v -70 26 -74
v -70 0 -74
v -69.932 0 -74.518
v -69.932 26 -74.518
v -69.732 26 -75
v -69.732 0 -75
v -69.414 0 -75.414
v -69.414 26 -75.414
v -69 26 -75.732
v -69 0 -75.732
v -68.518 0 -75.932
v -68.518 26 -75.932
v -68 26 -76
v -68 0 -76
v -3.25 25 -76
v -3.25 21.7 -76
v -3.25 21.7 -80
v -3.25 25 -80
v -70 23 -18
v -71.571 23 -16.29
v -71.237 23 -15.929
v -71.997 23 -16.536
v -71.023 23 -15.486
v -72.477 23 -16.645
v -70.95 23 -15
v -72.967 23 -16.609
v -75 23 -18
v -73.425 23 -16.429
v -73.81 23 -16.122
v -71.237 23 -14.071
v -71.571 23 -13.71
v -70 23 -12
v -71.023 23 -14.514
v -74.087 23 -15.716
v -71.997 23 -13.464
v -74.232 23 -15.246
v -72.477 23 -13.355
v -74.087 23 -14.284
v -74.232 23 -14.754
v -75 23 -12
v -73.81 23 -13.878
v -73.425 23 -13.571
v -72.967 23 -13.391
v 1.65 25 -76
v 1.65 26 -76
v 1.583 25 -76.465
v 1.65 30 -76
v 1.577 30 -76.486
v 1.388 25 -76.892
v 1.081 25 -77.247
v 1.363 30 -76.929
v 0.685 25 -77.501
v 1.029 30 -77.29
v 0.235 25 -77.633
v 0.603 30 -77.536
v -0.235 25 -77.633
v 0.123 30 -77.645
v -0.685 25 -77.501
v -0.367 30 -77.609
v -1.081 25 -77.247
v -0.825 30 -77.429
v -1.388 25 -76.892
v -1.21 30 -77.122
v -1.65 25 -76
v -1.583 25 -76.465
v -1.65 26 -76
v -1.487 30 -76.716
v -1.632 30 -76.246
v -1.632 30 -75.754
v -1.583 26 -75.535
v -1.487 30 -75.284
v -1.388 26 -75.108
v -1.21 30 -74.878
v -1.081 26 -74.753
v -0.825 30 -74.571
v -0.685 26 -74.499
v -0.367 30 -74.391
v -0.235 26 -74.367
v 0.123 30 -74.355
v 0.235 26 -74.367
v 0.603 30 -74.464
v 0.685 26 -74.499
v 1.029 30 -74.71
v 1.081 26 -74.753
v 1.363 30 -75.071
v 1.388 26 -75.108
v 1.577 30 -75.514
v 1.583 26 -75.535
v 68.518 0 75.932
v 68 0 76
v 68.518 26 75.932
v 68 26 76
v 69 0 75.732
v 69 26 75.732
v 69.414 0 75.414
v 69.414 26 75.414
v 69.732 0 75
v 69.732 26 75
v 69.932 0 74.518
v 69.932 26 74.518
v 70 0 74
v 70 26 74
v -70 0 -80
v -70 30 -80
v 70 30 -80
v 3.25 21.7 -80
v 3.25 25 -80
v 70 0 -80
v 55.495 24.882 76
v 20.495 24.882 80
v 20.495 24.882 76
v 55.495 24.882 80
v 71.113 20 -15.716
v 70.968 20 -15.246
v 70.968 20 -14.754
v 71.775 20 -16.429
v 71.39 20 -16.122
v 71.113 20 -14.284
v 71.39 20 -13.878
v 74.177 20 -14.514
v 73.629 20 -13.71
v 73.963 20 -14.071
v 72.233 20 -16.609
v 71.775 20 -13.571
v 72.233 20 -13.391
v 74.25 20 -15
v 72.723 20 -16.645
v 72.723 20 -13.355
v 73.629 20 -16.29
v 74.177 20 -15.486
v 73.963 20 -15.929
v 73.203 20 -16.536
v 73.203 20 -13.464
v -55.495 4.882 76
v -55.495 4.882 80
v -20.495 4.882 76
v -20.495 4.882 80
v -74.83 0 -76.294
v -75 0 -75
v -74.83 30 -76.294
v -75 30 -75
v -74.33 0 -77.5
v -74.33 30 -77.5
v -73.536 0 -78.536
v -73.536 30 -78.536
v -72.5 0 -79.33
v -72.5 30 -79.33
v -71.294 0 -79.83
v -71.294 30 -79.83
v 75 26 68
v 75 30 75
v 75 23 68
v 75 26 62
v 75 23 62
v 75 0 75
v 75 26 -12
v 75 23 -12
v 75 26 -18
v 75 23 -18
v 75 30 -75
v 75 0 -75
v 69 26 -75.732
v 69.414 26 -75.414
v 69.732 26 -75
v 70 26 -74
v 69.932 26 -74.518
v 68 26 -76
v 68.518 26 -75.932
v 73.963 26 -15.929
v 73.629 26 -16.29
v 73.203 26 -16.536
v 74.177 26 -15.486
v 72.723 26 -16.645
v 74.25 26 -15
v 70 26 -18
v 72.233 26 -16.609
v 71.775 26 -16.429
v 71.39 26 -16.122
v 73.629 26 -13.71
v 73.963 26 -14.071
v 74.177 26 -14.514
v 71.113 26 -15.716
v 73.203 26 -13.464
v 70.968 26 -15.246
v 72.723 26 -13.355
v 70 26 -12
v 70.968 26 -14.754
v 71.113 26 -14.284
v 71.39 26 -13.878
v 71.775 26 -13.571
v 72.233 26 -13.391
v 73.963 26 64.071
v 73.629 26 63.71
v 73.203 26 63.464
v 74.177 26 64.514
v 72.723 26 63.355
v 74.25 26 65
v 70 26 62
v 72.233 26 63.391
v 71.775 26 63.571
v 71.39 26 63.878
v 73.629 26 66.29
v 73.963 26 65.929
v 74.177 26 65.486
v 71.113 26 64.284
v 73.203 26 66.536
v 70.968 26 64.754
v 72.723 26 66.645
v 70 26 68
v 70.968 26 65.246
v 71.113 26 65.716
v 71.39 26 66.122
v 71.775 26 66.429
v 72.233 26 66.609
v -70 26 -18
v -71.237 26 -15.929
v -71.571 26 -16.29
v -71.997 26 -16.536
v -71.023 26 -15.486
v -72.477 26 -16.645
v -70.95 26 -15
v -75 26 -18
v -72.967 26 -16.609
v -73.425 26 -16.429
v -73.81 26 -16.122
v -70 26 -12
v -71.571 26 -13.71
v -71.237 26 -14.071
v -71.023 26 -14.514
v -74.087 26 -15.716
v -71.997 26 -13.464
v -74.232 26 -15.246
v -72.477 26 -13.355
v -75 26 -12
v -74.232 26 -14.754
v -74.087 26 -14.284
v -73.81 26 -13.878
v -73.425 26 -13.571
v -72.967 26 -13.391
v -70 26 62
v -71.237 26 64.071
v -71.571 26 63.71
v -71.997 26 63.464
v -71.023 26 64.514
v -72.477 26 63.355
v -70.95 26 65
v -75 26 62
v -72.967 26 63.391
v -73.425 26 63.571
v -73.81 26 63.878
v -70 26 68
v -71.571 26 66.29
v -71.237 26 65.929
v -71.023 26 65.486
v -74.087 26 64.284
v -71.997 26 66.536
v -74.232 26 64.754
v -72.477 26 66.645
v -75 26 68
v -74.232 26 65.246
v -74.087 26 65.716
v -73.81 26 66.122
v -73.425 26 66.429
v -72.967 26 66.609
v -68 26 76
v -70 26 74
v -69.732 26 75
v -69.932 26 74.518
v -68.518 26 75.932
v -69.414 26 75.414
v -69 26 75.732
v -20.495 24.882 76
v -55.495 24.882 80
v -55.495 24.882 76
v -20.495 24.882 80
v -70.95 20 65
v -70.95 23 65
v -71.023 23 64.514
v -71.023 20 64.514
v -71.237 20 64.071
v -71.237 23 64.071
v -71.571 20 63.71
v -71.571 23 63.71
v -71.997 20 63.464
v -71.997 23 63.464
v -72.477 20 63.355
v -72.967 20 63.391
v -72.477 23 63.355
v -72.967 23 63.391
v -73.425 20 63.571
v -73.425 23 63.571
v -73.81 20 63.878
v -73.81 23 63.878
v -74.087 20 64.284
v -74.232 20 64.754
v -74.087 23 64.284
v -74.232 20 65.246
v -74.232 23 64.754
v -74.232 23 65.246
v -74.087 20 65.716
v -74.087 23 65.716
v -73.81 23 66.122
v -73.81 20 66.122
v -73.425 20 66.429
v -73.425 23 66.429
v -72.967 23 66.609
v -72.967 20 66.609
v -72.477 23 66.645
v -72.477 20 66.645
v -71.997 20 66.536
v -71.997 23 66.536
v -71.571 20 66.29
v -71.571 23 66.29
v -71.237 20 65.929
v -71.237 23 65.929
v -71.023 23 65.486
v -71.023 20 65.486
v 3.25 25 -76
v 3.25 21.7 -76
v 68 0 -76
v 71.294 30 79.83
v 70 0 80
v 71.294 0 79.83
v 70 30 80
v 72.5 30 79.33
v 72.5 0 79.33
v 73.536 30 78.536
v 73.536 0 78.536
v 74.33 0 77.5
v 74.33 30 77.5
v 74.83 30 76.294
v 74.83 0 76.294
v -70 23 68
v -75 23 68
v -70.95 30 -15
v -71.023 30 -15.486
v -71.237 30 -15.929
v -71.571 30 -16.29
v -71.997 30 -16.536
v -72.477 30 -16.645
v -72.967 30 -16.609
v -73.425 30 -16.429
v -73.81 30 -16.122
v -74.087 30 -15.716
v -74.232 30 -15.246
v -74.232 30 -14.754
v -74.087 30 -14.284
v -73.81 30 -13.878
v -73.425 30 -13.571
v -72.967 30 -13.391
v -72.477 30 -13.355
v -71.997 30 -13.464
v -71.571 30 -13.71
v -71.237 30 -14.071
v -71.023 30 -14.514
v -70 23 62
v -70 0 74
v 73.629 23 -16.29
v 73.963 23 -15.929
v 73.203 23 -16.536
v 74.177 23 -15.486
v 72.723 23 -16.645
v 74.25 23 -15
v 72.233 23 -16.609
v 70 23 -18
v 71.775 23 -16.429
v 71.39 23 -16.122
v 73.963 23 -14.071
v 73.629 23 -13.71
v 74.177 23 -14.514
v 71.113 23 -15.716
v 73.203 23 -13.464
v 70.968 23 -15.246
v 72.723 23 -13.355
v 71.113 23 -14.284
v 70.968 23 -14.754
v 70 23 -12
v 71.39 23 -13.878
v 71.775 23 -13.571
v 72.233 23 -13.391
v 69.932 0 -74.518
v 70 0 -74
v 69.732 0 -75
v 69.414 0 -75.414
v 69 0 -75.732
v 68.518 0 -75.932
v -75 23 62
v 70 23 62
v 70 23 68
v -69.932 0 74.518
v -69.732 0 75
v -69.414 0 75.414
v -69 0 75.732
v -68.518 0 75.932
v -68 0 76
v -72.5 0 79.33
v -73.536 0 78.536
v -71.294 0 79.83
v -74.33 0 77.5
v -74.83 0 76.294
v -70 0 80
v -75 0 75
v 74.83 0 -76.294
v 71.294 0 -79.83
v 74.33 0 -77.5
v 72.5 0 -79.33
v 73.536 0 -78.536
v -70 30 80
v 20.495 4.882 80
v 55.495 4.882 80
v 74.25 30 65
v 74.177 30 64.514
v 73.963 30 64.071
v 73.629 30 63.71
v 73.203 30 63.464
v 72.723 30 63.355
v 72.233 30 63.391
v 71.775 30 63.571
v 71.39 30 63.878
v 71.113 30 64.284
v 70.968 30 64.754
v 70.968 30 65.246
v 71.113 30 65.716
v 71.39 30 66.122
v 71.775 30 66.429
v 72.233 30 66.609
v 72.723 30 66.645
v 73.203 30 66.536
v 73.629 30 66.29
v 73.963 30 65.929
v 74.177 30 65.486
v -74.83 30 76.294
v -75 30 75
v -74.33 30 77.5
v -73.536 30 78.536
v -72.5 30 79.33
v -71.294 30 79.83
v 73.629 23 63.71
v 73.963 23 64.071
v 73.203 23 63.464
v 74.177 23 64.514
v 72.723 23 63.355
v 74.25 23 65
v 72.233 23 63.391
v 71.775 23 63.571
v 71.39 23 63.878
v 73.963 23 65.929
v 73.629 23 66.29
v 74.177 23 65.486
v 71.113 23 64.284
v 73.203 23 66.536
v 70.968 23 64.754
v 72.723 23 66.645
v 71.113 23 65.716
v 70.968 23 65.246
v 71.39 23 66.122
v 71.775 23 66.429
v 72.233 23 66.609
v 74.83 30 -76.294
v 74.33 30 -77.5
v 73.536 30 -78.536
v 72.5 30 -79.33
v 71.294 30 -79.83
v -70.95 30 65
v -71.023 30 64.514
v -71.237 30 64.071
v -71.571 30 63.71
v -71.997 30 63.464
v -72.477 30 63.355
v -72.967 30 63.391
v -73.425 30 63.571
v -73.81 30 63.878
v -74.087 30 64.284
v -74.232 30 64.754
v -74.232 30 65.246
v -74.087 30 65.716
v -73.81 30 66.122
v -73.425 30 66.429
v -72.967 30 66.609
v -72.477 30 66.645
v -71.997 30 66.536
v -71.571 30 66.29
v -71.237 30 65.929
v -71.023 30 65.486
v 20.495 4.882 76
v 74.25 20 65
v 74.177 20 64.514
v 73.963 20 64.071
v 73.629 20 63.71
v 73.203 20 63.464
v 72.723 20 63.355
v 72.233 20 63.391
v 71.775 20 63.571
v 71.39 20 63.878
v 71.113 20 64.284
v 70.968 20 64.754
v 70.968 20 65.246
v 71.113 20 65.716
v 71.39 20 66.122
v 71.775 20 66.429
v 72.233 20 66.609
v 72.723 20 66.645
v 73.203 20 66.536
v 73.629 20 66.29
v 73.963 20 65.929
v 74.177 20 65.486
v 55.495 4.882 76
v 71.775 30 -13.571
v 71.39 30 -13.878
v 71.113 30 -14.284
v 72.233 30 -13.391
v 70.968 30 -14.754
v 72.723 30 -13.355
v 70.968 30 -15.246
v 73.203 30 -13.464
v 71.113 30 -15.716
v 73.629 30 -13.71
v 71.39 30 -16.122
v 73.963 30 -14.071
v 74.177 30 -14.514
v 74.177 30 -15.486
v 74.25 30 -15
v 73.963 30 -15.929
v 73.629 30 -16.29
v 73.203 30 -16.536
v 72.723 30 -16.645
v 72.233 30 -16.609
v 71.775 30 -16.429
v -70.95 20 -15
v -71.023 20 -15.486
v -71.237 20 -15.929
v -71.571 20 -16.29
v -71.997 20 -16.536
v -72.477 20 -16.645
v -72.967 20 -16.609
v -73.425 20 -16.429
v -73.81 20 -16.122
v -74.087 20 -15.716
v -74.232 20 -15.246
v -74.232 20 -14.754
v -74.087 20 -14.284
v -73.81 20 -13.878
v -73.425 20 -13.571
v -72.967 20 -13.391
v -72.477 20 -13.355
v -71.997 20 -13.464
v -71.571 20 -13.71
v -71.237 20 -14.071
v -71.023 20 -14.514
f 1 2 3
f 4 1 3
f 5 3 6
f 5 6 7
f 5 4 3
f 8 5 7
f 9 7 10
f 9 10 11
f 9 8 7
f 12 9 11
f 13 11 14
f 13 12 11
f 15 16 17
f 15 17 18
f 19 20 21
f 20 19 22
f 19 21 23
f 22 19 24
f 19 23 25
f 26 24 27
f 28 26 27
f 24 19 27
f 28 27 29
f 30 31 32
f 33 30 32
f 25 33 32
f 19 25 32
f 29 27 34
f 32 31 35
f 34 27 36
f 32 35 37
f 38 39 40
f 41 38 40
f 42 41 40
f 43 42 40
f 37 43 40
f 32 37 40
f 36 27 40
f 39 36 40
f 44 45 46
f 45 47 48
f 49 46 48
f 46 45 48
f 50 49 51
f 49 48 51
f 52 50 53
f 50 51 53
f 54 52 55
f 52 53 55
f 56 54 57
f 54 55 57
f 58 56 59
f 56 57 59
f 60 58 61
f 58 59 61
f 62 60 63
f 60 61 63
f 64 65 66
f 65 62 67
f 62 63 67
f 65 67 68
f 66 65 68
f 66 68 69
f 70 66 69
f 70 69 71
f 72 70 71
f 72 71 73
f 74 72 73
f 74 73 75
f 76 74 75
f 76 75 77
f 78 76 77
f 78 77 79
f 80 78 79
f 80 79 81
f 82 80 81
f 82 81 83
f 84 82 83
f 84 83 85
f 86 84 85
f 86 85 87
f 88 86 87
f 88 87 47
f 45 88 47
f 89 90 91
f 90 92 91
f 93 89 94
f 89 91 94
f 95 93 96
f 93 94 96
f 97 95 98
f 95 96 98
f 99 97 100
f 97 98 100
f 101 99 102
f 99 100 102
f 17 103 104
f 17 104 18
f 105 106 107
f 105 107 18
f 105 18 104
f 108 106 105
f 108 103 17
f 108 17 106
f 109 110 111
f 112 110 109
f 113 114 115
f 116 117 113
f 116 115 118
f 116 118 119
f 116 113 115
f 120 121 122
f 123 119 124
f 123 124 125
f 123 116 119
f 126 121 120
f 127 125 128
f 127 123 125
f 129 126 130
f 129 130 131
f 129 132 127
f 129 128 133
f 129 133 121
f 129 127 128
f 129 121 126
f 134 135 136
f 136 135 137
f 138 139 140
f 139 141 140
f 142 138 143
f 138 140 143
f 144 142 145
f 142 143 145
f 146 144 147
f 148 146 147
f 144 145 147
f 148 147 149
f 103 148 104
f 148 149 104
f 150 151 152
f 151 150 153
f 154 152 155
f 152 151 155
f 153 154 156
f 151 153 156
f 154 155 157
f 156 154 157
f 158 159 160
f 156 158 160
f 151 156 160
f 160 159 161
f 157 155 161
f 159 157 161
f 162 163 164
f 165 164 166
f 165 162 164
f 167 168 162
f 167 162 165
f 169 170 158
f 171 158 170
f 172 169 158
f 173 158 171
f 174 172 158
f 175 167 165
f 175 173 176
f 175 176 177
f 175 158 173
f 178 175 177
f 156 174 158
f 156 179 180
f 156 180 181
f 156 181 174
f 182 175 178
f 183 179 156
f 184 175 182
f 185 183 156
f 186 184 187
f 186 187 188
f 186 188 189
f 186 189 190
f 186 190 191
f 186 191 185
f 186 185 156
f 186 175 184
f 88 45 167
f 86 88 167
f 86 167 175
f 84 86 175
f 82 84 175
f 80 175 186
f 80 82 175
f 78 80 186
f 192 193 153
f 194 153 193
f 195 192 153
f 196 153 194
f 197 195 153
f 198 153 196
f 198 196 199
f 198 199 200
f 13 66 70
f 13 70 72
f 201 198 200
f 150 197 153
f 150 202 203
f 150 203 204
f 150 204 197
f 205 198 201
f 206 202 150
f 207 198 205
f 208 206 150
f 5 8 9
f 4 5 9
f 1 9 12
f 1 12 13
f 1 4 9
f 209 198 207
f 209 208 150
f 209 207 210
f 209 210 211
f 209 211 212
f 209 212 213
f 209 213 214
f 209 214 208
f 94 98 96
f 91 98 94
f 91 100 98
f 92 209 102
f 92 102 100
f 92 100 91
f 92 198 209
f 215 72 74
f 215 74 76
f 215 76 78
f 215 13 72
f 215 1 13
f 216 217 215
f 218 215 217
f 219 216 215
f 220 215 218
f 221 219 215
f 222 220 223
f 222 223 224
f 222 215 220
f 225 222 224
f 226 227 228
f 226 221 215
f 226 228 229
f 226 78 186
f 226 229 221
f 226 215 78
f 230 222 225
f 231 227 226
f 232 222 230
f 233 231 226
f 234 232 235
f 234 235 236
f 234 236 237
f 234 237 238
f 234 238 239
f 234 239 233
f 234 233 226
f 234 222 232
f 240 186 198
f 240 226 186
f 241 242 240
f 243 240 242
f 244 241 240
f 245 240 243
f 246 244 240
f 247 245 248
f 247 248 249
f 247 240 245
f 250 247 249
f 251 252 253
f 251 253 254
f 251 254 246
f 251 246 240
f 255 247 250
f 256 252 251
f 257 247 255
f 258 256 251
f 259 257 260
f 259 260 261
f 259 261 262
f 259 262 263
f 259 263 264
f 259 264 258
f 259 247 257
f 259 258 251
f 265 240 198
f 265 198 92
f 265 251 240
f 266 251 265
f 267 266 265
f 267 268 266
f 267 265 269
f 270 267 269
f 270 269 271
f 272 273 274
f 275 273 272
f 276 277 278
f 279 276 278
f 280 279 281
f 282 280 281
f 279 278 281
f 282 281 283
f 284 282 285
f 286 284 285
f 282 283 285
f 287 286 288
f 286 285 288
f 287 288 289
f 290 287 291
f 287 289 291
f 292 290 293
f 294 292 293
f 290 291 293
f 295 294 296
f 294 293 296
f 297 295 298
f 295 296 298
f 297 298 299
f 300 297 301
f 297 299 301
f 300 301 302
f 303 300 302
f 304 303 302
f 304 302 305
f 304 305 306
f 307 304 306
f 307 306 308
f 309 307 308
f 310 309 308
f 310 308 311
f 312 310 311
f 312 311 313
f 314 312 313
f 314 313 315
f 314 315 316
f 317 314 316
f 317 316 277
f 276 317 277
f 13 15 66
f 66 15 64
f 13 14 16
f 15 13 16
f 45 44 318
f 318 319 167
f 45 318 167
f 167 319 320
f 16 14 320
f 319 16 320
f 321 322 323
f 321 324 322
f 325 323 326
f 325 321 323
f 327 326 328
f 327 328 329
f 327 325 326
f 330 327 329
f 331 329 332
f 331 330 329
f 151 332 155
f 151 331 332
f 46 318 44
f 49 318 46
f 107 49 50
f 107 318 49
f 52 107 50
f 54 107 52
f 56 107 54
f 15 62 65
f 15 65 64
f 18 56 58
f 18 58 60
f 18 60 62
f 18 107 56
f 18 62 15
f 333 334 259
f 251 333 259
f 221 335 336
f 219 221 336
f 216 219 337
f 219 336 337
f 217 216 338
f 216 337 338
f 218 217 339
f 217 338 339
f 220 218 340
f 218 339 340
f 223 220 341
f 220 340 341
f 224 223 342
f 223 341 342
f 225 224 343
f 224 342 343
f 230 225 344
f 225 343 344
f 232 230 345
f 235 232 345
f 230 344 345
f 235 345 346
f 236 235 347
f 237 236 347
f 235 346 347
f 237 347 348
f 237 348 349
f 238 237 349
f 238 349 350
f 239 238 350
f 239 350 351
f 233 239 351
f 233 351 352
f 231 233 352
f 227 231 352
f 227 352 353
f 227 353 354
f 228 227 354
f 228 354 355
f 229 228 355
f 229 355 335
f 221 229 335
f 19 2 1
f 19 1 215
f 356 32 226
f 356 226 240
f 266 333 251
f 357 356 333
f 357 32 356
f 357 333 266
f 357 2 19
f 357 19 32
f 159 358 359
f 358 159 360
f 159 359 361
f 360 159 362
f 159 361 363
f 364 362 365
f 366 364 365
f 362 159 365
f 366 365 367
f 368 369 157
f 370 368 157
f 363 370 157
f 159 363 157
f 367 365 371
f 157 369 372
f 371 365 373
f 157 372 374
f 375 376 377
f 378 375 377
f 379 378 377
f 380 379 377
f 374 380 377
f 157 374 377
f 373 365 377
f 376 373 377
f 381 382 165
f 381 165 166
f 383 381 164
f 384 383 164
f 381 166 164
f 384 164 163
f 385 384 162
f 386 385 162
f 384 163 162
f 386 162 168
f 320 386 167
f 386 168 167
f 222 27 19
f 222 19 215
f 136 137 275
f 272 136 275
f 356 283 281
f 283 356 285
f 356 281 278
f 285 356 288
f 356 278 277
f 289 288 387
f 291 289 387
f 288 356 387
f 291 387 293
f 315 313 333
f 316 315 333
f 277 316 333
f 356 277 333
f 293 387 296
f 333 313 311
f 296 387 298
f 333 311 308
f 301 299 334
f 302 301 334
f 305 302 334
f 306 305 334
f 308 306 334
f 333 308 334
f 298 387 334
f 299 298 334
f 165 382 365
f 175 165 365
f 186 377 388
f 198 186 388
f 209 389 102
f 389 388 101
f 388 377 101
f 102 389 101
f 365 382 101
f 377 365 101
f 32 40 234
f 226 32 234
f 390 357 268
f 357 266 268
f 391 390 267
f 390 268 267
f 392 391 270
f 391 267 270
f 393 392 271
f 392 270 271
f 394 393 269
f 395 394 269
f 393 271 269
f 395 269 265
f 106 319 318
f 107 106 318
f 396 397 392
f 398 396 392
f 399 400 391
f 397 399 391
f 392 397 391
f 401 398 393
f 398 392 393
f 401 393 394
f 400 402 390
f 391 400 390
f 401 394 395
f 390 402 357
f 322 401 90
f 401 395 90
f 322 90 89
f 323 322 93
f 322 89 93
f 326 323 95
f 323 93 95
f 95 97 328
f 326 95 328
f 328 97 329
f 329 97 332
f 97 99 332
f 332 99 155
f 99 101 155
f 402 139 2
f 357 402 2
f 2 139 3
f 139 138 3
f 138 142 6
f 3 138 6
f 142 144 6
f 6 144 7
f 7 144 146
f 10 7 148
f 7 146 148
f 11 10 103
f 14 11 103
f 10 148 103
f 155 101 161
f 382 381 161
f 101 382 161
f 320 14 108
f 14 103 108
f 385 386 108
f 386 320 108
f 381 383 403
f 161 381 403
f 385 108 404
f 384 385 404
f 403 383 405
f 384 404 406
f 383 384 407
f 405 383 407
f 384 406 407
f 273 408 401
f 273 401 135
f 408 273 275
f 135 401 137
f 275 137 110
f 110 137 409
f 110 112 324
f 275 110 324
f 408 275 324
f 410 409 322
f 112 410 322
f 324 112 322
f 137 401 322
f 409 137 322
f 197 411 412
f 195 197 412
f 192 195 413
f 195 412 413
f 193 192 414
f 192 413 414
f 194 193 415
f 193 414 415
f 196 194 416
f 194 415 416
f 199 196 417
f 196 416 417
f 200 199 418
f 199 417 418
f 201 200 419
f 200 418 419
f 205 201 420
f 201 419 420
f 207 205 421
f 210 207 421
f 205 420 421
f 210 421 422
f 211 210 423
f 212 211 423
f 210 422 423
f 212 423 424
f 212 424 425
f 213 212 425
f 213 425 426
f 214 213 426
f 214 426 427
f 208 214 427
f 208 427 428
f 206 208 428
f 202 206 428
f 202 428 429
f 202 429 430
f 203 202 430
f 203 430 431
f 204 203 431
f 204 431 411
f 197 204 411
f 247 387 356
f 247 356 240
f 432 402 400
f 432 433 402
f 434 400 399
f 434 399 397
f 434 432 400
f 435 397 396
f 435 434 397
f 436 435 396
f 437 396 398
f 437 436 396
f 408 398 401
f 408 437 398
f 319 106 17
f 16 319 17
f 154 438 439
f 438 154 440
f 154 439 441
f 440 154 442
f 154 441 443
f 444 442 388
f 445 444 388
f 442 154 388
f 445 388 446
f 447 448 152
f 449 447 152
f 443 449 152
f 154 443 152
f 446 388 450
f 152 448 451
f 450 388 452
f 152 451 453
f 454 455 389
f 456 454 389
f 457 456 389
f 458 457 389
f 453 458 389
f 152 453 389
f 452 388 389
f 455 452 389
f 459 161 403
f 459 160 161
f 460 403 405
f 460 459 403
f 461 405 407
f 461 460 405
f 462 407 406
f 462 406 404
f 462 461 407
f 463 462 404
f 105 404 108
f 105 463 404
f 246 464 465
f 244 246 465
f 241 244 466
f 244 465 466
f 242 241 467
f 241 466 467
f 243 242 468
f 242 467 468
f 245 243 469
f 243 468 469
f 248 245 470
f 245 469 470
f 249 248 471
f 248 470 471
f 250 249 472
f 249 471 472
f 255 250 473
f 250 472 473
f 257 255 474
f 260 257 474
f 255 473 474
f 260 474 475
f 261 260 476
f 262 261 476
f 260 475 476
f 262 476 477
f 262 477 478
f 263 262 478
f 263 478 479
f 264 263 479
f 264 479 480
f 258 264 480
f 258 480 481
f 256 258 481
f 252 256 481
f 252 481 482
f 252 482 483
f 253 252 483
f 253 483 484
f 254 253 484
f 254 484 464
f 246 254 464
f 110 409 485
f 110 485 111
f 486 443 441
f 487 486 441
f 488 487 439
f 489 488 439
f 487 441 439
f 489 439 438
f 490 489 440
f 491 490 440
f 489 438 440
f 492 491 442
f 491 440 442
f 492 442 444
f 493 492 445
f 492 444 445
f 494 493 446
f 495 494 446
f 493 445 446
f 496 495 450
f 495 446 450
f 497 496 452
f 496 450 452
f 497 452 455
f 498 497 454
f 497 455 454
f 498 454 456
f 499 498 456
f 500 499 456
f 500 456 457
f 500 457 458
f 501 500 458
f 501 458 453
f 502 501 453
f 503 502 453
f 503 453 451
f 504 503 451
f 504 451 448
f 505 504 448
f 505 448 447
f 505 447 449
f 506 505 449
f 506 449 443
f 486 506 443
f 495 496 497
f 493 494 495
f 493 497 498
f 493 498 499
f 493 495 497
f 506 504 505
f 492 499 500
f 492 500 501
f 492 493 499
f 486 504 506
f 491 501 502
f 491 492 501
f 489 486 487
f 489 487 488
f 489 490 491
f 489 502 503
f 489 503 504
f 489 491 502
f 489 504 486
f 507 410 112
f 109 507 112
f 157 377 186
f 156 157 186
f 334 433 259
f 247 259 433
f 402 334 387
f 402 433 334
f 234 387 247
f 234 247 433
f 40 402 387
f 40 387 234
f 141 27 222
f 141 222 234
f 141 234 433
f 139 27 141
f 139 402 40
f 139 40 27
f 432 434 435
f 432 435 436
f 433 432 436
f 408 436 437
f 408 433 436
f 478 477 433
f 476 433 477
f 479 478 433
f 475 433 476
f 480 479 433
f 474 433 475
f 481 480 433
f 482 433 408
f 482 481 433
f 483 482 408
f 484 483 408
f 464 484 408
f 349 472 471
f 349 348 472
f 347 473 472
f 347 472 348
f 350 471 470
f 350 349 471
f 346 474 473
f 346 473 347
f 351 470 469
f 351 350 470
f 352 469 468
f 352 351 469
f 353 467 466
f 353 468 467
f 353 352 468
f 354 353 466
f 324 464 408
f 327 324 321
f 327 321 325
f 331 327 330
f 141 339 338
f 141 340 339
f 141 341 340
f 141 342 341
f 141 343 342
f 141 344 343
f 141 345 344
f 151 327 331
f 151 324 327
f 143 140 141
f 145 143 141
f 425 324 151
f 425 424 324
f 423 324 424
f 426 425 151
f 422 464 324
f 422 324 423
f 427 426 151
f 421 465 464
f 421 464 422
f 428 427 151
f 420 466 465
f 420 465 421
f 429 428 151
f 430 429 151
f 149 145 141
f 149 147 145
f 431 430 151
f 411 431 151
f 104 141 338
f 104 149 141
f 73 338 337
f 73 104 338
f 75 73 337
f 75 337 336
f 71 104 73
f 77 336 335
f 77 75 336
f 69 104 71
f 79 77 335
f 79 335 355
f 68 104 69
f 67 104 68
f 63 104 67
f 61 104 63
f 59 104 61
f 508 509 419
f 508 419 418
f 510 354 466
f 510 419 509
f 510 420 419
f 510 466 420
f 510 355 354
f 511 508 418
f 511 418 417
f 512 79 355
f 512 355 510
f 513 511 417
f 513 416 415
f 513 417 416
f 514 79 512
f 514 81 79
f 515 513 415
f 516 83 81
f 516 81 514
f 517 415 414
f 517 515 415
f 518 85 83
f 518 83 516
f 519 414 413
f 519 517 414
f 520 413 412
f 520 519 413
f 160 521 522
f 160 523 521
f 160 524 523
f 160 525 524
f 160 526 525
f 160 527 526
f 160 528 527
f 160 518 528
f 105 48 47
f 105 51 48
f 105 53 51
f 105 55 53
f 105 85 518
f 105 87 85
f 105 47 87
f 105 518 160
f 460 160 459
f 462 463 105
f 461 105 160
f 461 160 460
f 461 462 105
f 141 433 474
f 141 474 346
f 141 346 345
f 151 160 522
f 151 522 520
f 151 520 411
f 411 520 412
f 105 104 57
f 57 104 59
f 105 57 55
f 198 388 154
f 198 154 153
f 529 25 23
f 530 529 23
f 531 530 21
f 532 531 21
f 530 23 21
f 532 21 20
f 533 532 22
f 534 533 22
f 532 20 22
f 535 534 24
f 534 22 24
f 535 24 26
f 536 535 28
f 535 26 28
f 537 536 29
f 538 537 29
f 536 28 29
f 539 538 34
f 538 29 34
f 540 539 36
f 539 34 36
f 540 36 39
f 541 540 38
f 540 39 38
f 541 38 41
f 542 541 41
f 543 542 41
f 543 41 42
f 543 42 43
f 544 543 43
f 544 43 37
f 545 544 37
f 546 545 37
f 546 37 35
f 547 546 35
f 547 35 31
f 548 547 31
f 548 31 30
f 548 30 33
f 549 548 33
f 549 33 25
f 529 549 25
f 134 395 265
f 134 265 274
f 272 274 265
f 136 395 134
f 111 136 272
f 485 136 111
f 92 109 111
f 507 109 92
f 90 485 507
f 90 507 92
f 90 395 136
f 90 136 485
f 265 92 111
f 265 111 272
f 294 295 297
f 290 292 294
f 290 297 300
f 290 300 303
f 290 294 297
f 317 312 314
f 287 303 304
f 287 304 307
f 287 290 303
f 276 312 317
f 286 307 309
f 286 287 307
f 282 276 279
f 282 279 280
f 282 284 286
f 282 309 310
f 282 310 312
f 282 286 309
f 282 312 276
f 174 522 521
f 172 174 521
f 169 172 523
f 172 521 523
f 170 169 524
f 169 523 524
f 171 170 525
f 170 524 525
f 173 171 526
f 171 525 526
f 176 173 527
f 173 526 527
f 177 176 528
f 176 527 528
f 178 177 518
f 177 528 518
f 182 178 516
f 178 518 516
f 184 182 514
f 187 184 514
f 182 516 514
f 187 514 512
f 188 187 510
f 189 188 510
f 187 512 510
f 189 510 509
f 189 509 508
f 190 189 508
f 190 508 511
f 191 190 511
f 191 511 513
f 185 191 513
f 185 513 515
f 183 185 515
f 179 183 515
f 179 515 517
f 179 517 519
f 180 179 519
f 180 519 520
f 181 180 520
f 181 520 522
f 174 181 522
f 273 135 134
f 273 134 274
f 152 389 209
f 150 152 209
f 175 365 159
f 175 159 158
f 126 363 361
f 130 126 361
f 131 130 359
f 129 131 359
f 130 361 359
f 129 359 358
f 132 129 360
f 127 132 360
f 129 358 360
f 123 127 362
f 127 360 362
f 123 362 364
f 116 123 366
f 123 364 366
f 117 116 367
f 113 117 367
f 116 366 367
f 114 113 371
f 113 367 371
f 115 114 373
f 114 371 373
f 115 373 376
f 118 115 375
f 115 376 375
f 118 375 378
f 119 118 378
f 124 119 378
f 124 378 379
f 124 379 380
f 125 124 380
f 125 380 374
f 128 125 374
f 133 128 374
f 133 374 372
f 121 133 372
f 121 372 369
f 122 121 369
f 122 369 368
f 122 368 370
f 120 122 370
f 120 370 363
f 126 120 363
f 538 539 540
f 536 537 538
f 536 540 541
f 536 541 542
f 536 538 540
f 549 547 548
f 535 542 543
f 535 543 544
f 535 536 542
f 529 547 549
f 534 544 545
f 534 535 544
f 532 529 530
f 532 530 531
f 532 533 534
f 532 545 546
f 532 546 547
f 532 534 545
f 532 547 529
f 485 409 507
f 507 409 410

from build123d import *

# Parameters (mm, degrees)
SKETCH_1_W           = 150
SKETCH_1_H           = 160
EXTRUDE_1_DEPTH      = 30
FILLET_1_R           = 5
SKETCH_3_W           = 140
SKETCH_3_H           = 152
CUT_EXTRUDE_2_DEPTH  = 26
SKETCH_9_W           = 6
SKETCH_9_H           = 3
CUT_EXTRUDE_7_DEPTH  = 151
FILLET_2_R           = 2
SKETCH_11_R          = 1.65
CUT_EXTRUDE_8_DEPTH  = 8
SKETCH_12_W          = 6.5
SKETCH_12_H          = 3.3
CUT_EXTRUDE_9_DEPTH  = 15
SKETCH_16_W          = 35
SKETCH_16_H          = 20
CUT_EXTRUDE_12_DEPTH = 40
SKETCH_17_R          = 1.65
CUT_EXTRUDE_13_DEPTH = 10


with BuildPart() as part:
    # 草图1 → 凸台-拉伸1 (new body)
    with BuildSketch(Plane(origin=(0, 0, 0), x_dir=(1, 0, 0), z_dir=(0, 1, 0))):
        Rectangle(SKETCH_1_W, SKETCH_1_H)
    extrude(amount=EXTRUDE_1_DEPTH)

    # 圆角1
    fillet_1_edges = [part.edges().sort_by_distance(p)[0] for p in [
        (75, 15, 80),
        (-75, 15, 80),
        (-75, 15, -80),
        (75, 15, -80),
    ]]
    fillet(fillet_1_edges, radius=FILLET_1_R)

    # 草图3 → 切除-拉伸2 (cut)
    with BuildSketch(Plane.XZ):
        Rectangle(SKETCH_3_W, SKETCH_3_H)
    extrude(amount=-CUT_EXTRUDE_2_DEPTH, mode=Mode.SUBTRACT)

    # 草图9 → 切除-拉伸7 (cut, through all)
    with BuildSketch(Plane.ZY.offset(75)):
        with Locations((65, 24.5)):
            Rectangle(SKETCH_9_W, SKETCH_9_H)
        with Locations((-15, 24.5)):
            Rectangle(SKETCH_9_W, SKETCH_9_H)
    extrude(amount=-CUT_EXTRUDE_7_DEPTH, mode=Mode.SUBTRACT)

    # 圆角2
    fillet_2_edges = [part.edges().sort_by_distance(p)[0] for p in [
        (-70, 13, -76),
        (-70, 13, 76),
        (70, 13, 76),
        (70, 13, -76),
    ]]
    fillet(fillet_2_edges, radius=FILLET_2_R)

    # 草图11 → 切除-拉伸8 (cut)
    with BuildSketch(Plane(origin=(0, 30, 0), x_dir=(1, 0, 0), z_dir=(0, 1, 0))):
        with Locations((0, 76)):
            Circle(SKETCH_11_R)
    extrude(amount=-CUT_EXTRUDE_8_DEPTH, mode=Mode.SUBTRACT)

    # 草图12 → 切除-拉伸9 (cut)
    with BuildSketch(Plane(origin=(0, 0, -80), x_dir=(-1, 0, 0), z_dir=(0, 0, -1))):
        with Locations((0, 23.35)):
            Rectangle(SKETCH_12_W, SKETCH_12_H)
    extrude(amount=-CUT_EXTRUDE_9_DEPTH, mode=Mode.SUBTRACT)

    # 草图16 → 切除-拉伸12 (cut)
    with BuildSketch(Plane.XY.offset(80)):
        with Locations((37.995108753, 14.88178475)):
            Rectangle(SKETCH_16_W, SKETCH_16_H)
        with Locations((-37.995108753, 14.88178475)):
            Rectangle(SKETCH_16_W, SKETCH_16_H)
    extrude(amount=-CUT_EXTRUDE_12_DEPTH, mode=Mode.SUBTRACT)

    # 草图17 → 切除-拉伸13 (cut)
    with BuildSketch(Plane(origin=(0, 30, 0), x_dir=(1, 0, 0), z_dir=(0, 1, 0))):
        with Locations((-72.6, -65)):
            Circle(SKETCH_17_R)
        with Locations((72.6, -65)):
            Circle(SKETCH_17_R)
        with Locations((-72.6, 15)):
            Circle(SKETCH_17_R)
        with Locations((72.6, 15)):
            Circle(SKETCH_17_R)
    extrude(amount=-CUT_EXTRUDE_13_DEPTH, mode=Mode.SUBTRACT)


solid = part.part
